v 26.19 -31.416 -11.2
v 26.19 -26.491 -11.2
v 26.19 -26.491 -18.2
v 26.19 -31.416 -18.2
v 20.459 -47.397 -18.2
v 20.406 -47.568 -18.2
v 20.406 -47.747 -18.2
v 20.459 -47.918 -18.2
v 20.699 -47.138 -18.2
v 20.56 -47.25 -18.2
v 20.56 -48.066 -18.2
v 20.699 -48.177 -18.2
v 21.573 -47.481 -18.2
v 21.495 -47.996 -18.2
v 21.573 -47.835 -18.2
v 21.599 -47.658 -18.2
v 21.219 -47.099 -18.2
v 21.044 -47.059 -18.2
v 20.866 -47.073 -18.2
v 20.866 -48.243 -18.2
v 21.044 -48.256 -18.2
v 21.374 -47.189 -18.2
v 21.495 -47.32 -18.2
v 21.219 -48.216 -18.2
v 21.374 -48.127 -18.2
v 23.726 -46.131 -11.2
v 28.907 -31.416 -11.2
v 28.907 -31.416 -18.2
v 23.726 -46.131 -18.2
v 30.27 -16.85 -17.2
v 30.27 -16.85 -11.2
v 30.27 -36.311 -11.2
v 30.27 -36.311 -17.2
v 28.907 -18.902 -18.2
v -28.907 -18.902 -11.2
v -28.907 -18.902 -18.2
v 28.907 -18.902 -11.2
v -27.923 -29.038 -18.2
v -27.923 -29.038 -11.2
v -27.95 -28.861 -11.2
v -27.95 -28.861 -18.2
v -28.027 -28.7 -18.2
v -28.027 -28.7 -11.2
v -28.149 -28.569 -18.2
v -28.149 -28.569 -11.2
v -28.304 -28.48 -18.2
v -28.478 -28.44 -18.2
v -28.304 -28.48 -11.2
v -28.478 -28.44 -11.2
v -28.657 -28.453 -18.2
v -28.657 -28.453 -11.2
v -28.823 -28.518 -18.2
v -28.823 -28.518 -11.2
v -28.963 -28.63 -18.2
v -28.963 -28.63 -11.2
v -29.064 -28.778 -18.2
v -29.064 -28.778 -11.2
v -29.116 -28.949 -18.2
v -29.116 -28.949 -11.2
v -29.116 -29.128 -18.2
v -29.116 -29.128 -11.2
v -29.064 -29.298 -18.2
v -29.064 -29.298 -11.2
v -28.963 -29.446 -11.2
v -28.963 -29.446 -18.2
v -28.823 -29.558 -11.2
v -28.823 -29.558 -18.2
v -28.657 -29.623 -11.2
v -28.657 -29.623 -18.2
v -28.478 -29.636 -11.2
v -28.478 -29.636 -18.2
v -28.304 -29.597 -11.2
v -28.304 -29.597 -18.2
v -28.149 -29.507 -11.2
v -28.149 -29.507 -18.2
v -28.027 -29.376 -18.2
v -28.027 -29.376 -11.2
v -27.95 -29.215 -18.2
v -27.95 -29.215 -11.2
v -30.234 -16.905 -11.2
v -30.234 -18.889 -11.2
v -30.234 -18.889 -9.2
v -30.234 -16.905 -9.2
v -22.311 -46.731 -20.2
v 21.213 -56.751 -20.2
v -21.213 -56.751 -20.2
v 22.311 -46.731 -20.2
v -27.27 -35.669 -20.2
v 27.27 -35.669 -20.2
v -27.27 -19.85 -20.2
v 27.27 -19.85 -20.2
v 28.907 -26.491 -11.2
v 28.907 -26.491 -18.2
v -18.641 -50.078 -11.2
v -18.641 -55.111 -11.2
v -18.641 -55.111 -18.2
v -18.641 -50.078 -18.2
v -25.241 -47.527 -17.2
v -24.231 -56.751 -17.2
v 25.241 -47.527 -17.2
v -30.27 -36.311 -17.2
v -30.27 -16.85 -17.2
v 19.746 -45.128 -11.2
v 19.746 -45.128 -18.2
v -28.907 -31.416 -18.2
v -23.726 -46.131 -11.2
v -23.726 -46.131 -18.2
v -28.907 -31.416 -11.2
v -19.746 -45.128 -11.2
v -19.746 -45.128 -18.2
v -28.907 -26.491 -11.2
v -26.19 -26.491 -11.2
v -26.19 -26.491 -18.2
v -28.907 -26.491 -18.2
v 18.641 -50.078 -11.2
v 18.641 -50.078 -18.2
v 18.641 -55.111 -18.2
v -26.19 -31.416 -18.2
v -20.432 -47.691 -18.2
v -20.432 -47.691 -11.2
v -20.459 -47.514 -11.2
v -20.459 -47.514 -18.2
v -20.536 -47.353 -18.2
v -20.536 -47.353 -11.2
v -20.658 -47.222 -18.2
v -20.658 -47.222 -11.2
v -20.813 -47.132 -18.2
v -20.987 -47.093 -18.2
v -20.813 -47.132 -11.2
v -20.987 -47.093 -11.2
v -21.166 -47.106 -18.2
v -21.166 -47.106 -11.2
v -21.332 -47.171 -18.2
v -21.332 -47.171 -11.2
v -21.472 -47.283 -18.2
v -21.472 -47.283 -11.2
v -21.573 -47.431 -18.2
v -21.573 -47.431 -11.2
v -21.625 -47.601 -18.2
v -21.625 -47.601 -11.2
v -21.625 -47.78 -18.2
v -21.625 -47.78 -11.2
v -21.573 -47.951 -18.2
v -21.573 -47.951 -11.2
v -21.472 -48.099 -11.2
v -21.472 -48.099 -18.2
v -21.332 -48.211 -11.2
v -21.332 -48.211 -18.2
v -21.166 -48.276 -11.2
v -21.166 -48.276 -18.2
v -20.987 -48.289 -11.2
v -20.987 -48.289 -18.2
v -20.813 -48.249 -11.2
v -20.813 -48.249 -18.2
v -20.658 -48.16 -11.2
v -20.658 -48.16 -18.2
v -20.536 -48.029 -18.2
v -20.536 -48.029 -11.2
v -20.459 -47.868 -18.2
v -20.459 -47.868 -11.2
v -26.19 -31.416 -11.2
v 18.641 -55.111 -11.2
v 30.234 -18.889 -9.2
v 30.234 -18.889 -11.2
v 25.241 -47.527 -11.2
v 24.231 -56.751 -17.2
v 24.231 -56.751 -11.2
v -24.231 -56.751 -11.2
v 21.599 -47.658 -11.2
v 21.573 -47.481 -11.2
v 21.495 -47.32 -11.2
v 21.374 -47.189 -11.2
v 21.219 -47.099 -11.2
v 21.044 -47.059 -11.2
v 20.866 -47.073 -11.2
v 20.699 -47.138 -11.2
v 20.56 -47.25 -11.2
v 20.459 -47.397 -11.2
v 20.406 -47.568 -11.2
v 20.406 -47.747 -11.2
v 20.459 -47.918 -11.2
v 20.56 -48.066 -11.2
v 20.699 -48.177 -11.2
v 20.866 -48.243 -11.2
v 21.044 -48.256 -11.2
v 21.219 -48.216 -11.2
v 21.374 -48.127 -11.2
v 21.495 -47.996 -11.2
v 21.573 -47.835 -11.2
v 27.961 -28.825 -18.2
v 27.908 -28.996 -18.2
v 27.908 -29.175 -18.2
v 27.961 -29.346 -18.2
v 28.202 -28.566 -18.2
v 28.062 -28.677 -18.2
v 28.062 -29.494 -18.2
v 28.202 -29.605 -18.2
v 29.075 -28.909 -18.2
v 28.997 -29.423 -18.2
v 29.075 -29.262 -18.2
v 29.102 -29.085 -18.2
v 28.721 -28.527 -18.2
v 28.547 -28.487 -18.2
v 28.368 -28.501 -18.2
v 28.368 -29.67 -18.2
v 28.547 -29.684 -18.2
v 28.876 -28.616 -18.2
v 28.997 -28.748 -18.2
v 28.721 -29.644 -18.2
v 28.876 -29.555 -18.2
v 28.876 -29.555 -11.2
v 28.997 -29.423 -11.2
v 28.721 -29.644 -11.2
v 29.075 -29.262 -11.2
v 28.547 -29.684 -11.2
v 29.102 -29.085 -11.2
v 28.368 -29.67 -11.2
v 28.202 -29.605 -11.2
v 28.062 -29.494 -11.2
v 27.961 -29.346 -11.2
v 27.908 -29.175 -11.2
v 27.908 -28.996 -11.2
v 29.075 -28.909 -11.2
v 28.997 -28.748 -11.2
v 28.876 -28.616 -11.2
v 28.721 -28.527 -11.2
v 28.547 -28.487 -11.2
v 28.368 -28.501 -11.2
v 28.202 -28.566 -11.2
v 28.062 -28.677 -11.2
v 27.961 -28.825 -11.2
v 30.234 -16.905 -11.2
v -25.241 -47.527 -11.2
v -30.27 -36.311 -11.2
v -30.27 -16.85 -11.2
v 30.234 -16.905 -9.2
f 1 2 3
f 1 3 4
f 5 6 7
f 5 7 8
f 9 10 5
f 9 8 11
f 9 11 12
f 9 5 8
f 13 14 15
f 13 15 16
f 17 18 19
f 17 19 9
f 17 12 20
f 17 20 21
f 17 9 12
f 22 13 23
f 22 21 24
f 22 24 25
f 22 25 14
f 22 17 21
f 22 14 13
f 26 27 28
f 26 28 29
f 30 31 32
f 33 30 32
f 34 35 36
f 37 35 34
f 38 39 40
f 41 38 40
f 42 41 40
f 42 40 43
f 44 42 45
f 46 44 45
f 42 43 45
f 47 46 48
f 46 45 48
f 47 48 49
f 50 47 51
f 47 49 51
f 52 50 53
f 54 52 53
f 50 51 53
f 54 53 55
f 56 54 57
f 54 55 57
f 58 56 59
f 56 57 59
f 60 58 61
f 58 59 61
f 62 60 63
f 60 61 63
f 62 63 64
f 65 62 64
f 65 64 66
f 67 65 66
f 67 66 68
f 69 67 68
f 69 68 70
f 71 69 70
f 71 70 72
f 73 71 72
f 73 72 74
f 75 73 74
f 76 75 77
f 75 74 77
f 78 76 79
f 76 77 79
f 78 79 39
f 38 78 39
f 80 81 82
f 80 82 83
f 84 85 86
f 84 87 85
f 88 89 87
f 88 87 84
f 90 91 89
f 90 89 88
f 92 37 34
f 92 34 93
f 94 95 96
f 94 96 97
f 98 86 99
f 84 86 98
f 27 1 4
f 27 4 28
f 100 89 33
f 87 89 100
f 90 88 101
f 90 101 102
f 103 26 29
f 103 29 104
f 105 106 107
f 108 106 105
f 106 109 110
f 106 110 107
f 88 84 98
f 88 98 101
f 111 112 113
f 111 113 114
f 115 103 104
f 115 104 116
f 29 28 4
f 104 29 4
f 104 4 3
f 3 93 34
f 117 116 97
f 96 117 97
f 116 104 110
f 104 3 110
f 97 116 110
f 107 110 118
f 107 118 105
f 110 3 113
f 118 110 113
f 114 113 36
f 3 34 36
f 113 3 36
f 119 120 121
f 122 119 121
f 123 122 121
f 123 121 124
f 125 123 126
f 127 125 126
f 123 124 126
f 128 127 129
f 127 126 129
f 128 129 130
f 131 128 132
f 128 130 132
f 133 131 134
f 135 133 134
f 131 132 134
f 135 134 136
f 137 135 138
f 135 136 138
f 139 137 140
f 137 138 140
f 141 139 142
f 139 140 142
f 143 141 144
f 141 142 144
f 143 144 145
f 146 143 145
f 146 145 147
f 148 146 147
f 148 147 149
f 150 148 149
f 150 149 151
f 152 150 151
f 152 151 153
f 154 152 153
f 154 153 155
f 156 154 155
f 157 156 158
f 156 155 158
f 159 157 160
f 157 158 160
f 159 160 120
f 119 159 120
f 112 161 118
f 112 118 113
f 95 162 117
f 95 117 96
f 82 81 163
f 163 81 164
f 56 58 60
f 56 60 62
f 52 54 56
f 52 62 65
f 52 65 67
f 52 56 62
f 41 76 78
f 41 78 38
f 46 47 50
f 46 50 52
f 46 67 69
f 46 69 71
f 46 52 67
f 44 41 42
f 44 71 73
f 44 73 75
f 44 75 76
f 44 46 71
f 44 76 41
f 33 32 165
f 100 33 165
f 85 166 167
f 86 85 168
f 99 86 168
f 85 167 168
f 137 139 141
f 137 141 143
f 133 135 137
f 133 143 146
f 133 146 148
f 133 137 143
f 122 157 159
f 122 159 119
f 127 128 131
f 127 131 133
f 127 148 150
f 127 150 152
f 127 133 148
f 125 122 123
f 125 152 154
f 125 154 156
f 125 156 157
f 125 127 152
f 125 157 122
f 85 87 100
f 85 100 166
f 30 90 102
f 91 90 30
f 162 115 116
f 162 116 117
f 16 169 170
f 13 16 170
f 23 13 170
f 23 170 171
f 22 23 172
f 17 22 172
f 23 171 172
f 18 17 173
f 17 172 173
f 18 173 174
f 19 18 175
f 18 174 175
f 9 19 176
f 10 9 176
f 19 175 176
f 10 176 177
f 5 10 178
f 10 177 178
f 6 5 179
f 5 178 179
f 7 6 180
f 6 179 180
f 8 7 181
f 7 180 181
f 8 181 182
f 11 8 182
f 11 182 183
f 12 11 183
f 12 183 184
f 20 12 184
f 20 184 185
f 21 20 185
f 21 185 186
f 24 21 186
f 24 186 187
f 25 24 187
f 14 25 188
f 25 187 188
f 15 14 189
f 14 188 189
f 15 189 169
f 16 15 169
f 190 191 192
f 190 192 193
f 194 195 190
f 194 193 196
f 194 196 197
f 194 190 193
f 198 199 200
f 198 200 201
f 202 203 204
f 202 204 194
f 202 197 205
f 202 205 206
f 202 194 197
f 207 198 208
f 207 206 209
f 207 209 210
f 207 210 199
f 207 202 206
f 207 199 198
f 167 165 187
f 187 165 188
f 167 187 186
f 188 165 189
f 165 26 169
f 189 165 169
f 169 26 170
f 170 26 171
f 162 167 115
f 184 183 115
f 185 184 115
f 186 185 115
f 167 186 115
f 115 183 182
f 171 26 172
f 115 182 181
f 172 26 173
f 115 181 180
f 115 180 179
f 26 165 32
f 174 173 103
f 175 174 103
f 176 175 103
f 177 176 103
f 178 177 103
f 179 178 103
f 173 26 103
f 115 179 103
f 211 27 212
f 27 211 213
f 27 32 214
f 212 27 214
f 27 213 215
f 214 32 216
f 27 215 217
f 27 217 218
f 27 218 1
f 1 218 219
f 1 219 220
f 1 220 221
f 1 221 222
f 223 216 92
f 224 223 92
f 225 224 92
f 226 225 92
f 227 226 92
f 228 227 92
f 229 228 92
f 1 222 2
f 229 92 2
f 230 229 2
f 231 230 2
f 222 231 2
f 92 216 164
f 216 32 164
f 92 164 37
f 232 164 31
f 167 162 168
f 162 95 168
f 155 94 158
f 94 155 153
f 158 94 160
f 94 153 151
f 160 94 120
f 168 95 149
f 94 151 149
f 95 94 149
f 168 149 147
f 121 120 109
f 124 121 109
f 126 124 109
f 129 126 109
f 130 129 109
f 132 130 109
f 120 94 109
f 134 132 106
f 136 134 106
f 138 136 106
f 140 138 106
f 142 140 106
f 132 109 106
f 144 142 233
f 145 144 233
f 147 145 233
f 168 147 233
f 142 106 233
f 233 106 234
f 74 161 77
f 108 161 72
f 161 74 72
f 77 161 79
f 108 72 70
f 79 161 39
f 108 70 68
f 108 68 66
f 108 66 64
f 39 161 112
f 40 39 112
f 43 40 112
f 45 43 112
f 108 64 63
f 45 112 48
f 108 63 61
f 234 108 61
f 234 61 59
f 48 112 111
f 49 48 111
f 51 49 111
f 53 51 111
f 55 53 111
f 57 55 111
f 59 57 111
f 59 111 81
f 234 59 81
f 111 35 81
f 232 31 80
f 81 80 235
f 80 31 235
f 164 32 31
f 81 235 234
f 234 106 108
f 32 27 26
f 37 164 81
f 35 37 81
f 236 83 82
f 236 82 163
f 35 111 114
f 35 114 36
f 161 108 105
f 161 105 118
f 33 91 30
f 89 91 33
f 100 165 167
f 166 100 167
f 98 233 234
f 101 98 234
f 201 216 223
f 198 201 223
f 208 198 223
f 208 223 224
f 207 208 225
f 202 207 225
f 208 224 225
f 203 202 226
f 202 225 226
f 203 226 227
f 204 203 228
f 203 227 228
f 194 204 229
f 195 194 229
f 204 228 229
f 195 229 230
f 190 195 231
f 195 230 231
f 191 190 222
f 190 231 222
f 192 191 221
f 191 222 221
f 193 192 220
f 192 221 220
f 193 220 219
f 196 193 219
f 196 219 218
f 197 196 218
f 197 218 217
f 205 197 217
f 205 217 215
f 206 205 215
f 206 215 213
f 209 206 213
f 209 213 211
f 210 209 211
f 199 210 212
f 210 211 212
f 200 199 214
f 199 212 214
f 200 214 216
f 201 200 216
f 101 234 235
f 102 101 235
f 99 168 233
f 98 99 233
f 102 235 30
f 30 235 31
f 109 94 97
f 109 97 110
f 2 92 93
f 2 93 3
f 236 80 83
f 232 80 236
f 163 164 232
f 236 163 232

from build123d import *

# Parameters (mm, degrees)
PAD046_DEPTH    = 9
CHAMFER016_SIZE = 3
SKETCH088_R     = 0.6
POCKET040_DEPTH = 7
SKETCH089_W     = 60.467484
SKETCH089_H     = 1.984499
PAD047_DEPTH    = 2


with BuildPart() as part:
    # Sketch085 → Pad046 (new body)
    with BuildSketch(Plane.XY.offset(-11)):
        Polygon((-30.27, -16.85), (30.27, -16.85), (30.27, -36.310793), (25.241268, -47.527155), (24.231199, -56.751064), (-24.231199, -56.751064), (-25.241268, -47.527155), (-30.27, -36.310793), align=None)
    extrude(amount=-PAD046_DEPTH)

    # Chamfer016
    chamfer016_edges = [part.edges().sort_by_distance(p)[0] for p in [
        (24.736234, -52.139109, -20),
        (27.755634, -41.918974, -20),
        (30.27, -26.580397, -20),
        (0, -16.85, -20),
        (-30.27, -26.580397, -20),
        (-27.755634, -41.918974, -20),
        (-24.736234, -52.139109, -20),
    ]]
    chamfer(chamfer016_edges, length=CHAMFER016_SIZE)

    # Sketch088 (on Face4 of Chamfer016) → Pocket040 (cut)
    with BuildSketch(Plane.XY.offset(-11)):
        with Locations((-28.523069, -29.038105)):
            Circle(SKETCH088_R)
        with Locations((28.50172, -29.085497)):
            Circle(SKETCH088_R)
        with Locations((20.999411, -47.657658)):
            Circle(SKETCH088_R)
        with Locations((-21.032127, -47.690895)):
            Circle(SKETCH088_R)
        Polygon((-28.906572, -18.901762), (28.906572, -18.901762), (28.906572, -26.491486), (26.18985, -26.491486), (26.18985, -31.415663), (28.906572, -31.415663), (23.726078, -46.130531), (19.745981, -45.128311), (18.640522, -50.078386), (18.640522, -55.110878), (-18.640522, -55.110878), (-18.640522, -50.078386), (-19.745981, -45.128311), (-23.726078, -46.130531), (-28.906572, -31.415663), (-26.18985, -31.415663), (-26.18985, -26.491486), (-28.906572, -26.491486), align=None)
    extrude(amount=-POCKET040_DEPTH, mode=Mode.SUBTRACT)

    # Sketch089 (on Face4 of Pocket040) → Pad047 (join)
    with BuildSketch(Plane.XY.offset(-11)):
        with Locations((0, -17.897196)):
            Rectangle(SKETCH089_W, SKETCH089_H)
    extrude(amount=PAD047_DEPTH)


with BuildPart() as part_1:
    # Body009 placement: moved
    add(part.part.moved(Location((0, 0, -0.2))))


solid = part_1.part
